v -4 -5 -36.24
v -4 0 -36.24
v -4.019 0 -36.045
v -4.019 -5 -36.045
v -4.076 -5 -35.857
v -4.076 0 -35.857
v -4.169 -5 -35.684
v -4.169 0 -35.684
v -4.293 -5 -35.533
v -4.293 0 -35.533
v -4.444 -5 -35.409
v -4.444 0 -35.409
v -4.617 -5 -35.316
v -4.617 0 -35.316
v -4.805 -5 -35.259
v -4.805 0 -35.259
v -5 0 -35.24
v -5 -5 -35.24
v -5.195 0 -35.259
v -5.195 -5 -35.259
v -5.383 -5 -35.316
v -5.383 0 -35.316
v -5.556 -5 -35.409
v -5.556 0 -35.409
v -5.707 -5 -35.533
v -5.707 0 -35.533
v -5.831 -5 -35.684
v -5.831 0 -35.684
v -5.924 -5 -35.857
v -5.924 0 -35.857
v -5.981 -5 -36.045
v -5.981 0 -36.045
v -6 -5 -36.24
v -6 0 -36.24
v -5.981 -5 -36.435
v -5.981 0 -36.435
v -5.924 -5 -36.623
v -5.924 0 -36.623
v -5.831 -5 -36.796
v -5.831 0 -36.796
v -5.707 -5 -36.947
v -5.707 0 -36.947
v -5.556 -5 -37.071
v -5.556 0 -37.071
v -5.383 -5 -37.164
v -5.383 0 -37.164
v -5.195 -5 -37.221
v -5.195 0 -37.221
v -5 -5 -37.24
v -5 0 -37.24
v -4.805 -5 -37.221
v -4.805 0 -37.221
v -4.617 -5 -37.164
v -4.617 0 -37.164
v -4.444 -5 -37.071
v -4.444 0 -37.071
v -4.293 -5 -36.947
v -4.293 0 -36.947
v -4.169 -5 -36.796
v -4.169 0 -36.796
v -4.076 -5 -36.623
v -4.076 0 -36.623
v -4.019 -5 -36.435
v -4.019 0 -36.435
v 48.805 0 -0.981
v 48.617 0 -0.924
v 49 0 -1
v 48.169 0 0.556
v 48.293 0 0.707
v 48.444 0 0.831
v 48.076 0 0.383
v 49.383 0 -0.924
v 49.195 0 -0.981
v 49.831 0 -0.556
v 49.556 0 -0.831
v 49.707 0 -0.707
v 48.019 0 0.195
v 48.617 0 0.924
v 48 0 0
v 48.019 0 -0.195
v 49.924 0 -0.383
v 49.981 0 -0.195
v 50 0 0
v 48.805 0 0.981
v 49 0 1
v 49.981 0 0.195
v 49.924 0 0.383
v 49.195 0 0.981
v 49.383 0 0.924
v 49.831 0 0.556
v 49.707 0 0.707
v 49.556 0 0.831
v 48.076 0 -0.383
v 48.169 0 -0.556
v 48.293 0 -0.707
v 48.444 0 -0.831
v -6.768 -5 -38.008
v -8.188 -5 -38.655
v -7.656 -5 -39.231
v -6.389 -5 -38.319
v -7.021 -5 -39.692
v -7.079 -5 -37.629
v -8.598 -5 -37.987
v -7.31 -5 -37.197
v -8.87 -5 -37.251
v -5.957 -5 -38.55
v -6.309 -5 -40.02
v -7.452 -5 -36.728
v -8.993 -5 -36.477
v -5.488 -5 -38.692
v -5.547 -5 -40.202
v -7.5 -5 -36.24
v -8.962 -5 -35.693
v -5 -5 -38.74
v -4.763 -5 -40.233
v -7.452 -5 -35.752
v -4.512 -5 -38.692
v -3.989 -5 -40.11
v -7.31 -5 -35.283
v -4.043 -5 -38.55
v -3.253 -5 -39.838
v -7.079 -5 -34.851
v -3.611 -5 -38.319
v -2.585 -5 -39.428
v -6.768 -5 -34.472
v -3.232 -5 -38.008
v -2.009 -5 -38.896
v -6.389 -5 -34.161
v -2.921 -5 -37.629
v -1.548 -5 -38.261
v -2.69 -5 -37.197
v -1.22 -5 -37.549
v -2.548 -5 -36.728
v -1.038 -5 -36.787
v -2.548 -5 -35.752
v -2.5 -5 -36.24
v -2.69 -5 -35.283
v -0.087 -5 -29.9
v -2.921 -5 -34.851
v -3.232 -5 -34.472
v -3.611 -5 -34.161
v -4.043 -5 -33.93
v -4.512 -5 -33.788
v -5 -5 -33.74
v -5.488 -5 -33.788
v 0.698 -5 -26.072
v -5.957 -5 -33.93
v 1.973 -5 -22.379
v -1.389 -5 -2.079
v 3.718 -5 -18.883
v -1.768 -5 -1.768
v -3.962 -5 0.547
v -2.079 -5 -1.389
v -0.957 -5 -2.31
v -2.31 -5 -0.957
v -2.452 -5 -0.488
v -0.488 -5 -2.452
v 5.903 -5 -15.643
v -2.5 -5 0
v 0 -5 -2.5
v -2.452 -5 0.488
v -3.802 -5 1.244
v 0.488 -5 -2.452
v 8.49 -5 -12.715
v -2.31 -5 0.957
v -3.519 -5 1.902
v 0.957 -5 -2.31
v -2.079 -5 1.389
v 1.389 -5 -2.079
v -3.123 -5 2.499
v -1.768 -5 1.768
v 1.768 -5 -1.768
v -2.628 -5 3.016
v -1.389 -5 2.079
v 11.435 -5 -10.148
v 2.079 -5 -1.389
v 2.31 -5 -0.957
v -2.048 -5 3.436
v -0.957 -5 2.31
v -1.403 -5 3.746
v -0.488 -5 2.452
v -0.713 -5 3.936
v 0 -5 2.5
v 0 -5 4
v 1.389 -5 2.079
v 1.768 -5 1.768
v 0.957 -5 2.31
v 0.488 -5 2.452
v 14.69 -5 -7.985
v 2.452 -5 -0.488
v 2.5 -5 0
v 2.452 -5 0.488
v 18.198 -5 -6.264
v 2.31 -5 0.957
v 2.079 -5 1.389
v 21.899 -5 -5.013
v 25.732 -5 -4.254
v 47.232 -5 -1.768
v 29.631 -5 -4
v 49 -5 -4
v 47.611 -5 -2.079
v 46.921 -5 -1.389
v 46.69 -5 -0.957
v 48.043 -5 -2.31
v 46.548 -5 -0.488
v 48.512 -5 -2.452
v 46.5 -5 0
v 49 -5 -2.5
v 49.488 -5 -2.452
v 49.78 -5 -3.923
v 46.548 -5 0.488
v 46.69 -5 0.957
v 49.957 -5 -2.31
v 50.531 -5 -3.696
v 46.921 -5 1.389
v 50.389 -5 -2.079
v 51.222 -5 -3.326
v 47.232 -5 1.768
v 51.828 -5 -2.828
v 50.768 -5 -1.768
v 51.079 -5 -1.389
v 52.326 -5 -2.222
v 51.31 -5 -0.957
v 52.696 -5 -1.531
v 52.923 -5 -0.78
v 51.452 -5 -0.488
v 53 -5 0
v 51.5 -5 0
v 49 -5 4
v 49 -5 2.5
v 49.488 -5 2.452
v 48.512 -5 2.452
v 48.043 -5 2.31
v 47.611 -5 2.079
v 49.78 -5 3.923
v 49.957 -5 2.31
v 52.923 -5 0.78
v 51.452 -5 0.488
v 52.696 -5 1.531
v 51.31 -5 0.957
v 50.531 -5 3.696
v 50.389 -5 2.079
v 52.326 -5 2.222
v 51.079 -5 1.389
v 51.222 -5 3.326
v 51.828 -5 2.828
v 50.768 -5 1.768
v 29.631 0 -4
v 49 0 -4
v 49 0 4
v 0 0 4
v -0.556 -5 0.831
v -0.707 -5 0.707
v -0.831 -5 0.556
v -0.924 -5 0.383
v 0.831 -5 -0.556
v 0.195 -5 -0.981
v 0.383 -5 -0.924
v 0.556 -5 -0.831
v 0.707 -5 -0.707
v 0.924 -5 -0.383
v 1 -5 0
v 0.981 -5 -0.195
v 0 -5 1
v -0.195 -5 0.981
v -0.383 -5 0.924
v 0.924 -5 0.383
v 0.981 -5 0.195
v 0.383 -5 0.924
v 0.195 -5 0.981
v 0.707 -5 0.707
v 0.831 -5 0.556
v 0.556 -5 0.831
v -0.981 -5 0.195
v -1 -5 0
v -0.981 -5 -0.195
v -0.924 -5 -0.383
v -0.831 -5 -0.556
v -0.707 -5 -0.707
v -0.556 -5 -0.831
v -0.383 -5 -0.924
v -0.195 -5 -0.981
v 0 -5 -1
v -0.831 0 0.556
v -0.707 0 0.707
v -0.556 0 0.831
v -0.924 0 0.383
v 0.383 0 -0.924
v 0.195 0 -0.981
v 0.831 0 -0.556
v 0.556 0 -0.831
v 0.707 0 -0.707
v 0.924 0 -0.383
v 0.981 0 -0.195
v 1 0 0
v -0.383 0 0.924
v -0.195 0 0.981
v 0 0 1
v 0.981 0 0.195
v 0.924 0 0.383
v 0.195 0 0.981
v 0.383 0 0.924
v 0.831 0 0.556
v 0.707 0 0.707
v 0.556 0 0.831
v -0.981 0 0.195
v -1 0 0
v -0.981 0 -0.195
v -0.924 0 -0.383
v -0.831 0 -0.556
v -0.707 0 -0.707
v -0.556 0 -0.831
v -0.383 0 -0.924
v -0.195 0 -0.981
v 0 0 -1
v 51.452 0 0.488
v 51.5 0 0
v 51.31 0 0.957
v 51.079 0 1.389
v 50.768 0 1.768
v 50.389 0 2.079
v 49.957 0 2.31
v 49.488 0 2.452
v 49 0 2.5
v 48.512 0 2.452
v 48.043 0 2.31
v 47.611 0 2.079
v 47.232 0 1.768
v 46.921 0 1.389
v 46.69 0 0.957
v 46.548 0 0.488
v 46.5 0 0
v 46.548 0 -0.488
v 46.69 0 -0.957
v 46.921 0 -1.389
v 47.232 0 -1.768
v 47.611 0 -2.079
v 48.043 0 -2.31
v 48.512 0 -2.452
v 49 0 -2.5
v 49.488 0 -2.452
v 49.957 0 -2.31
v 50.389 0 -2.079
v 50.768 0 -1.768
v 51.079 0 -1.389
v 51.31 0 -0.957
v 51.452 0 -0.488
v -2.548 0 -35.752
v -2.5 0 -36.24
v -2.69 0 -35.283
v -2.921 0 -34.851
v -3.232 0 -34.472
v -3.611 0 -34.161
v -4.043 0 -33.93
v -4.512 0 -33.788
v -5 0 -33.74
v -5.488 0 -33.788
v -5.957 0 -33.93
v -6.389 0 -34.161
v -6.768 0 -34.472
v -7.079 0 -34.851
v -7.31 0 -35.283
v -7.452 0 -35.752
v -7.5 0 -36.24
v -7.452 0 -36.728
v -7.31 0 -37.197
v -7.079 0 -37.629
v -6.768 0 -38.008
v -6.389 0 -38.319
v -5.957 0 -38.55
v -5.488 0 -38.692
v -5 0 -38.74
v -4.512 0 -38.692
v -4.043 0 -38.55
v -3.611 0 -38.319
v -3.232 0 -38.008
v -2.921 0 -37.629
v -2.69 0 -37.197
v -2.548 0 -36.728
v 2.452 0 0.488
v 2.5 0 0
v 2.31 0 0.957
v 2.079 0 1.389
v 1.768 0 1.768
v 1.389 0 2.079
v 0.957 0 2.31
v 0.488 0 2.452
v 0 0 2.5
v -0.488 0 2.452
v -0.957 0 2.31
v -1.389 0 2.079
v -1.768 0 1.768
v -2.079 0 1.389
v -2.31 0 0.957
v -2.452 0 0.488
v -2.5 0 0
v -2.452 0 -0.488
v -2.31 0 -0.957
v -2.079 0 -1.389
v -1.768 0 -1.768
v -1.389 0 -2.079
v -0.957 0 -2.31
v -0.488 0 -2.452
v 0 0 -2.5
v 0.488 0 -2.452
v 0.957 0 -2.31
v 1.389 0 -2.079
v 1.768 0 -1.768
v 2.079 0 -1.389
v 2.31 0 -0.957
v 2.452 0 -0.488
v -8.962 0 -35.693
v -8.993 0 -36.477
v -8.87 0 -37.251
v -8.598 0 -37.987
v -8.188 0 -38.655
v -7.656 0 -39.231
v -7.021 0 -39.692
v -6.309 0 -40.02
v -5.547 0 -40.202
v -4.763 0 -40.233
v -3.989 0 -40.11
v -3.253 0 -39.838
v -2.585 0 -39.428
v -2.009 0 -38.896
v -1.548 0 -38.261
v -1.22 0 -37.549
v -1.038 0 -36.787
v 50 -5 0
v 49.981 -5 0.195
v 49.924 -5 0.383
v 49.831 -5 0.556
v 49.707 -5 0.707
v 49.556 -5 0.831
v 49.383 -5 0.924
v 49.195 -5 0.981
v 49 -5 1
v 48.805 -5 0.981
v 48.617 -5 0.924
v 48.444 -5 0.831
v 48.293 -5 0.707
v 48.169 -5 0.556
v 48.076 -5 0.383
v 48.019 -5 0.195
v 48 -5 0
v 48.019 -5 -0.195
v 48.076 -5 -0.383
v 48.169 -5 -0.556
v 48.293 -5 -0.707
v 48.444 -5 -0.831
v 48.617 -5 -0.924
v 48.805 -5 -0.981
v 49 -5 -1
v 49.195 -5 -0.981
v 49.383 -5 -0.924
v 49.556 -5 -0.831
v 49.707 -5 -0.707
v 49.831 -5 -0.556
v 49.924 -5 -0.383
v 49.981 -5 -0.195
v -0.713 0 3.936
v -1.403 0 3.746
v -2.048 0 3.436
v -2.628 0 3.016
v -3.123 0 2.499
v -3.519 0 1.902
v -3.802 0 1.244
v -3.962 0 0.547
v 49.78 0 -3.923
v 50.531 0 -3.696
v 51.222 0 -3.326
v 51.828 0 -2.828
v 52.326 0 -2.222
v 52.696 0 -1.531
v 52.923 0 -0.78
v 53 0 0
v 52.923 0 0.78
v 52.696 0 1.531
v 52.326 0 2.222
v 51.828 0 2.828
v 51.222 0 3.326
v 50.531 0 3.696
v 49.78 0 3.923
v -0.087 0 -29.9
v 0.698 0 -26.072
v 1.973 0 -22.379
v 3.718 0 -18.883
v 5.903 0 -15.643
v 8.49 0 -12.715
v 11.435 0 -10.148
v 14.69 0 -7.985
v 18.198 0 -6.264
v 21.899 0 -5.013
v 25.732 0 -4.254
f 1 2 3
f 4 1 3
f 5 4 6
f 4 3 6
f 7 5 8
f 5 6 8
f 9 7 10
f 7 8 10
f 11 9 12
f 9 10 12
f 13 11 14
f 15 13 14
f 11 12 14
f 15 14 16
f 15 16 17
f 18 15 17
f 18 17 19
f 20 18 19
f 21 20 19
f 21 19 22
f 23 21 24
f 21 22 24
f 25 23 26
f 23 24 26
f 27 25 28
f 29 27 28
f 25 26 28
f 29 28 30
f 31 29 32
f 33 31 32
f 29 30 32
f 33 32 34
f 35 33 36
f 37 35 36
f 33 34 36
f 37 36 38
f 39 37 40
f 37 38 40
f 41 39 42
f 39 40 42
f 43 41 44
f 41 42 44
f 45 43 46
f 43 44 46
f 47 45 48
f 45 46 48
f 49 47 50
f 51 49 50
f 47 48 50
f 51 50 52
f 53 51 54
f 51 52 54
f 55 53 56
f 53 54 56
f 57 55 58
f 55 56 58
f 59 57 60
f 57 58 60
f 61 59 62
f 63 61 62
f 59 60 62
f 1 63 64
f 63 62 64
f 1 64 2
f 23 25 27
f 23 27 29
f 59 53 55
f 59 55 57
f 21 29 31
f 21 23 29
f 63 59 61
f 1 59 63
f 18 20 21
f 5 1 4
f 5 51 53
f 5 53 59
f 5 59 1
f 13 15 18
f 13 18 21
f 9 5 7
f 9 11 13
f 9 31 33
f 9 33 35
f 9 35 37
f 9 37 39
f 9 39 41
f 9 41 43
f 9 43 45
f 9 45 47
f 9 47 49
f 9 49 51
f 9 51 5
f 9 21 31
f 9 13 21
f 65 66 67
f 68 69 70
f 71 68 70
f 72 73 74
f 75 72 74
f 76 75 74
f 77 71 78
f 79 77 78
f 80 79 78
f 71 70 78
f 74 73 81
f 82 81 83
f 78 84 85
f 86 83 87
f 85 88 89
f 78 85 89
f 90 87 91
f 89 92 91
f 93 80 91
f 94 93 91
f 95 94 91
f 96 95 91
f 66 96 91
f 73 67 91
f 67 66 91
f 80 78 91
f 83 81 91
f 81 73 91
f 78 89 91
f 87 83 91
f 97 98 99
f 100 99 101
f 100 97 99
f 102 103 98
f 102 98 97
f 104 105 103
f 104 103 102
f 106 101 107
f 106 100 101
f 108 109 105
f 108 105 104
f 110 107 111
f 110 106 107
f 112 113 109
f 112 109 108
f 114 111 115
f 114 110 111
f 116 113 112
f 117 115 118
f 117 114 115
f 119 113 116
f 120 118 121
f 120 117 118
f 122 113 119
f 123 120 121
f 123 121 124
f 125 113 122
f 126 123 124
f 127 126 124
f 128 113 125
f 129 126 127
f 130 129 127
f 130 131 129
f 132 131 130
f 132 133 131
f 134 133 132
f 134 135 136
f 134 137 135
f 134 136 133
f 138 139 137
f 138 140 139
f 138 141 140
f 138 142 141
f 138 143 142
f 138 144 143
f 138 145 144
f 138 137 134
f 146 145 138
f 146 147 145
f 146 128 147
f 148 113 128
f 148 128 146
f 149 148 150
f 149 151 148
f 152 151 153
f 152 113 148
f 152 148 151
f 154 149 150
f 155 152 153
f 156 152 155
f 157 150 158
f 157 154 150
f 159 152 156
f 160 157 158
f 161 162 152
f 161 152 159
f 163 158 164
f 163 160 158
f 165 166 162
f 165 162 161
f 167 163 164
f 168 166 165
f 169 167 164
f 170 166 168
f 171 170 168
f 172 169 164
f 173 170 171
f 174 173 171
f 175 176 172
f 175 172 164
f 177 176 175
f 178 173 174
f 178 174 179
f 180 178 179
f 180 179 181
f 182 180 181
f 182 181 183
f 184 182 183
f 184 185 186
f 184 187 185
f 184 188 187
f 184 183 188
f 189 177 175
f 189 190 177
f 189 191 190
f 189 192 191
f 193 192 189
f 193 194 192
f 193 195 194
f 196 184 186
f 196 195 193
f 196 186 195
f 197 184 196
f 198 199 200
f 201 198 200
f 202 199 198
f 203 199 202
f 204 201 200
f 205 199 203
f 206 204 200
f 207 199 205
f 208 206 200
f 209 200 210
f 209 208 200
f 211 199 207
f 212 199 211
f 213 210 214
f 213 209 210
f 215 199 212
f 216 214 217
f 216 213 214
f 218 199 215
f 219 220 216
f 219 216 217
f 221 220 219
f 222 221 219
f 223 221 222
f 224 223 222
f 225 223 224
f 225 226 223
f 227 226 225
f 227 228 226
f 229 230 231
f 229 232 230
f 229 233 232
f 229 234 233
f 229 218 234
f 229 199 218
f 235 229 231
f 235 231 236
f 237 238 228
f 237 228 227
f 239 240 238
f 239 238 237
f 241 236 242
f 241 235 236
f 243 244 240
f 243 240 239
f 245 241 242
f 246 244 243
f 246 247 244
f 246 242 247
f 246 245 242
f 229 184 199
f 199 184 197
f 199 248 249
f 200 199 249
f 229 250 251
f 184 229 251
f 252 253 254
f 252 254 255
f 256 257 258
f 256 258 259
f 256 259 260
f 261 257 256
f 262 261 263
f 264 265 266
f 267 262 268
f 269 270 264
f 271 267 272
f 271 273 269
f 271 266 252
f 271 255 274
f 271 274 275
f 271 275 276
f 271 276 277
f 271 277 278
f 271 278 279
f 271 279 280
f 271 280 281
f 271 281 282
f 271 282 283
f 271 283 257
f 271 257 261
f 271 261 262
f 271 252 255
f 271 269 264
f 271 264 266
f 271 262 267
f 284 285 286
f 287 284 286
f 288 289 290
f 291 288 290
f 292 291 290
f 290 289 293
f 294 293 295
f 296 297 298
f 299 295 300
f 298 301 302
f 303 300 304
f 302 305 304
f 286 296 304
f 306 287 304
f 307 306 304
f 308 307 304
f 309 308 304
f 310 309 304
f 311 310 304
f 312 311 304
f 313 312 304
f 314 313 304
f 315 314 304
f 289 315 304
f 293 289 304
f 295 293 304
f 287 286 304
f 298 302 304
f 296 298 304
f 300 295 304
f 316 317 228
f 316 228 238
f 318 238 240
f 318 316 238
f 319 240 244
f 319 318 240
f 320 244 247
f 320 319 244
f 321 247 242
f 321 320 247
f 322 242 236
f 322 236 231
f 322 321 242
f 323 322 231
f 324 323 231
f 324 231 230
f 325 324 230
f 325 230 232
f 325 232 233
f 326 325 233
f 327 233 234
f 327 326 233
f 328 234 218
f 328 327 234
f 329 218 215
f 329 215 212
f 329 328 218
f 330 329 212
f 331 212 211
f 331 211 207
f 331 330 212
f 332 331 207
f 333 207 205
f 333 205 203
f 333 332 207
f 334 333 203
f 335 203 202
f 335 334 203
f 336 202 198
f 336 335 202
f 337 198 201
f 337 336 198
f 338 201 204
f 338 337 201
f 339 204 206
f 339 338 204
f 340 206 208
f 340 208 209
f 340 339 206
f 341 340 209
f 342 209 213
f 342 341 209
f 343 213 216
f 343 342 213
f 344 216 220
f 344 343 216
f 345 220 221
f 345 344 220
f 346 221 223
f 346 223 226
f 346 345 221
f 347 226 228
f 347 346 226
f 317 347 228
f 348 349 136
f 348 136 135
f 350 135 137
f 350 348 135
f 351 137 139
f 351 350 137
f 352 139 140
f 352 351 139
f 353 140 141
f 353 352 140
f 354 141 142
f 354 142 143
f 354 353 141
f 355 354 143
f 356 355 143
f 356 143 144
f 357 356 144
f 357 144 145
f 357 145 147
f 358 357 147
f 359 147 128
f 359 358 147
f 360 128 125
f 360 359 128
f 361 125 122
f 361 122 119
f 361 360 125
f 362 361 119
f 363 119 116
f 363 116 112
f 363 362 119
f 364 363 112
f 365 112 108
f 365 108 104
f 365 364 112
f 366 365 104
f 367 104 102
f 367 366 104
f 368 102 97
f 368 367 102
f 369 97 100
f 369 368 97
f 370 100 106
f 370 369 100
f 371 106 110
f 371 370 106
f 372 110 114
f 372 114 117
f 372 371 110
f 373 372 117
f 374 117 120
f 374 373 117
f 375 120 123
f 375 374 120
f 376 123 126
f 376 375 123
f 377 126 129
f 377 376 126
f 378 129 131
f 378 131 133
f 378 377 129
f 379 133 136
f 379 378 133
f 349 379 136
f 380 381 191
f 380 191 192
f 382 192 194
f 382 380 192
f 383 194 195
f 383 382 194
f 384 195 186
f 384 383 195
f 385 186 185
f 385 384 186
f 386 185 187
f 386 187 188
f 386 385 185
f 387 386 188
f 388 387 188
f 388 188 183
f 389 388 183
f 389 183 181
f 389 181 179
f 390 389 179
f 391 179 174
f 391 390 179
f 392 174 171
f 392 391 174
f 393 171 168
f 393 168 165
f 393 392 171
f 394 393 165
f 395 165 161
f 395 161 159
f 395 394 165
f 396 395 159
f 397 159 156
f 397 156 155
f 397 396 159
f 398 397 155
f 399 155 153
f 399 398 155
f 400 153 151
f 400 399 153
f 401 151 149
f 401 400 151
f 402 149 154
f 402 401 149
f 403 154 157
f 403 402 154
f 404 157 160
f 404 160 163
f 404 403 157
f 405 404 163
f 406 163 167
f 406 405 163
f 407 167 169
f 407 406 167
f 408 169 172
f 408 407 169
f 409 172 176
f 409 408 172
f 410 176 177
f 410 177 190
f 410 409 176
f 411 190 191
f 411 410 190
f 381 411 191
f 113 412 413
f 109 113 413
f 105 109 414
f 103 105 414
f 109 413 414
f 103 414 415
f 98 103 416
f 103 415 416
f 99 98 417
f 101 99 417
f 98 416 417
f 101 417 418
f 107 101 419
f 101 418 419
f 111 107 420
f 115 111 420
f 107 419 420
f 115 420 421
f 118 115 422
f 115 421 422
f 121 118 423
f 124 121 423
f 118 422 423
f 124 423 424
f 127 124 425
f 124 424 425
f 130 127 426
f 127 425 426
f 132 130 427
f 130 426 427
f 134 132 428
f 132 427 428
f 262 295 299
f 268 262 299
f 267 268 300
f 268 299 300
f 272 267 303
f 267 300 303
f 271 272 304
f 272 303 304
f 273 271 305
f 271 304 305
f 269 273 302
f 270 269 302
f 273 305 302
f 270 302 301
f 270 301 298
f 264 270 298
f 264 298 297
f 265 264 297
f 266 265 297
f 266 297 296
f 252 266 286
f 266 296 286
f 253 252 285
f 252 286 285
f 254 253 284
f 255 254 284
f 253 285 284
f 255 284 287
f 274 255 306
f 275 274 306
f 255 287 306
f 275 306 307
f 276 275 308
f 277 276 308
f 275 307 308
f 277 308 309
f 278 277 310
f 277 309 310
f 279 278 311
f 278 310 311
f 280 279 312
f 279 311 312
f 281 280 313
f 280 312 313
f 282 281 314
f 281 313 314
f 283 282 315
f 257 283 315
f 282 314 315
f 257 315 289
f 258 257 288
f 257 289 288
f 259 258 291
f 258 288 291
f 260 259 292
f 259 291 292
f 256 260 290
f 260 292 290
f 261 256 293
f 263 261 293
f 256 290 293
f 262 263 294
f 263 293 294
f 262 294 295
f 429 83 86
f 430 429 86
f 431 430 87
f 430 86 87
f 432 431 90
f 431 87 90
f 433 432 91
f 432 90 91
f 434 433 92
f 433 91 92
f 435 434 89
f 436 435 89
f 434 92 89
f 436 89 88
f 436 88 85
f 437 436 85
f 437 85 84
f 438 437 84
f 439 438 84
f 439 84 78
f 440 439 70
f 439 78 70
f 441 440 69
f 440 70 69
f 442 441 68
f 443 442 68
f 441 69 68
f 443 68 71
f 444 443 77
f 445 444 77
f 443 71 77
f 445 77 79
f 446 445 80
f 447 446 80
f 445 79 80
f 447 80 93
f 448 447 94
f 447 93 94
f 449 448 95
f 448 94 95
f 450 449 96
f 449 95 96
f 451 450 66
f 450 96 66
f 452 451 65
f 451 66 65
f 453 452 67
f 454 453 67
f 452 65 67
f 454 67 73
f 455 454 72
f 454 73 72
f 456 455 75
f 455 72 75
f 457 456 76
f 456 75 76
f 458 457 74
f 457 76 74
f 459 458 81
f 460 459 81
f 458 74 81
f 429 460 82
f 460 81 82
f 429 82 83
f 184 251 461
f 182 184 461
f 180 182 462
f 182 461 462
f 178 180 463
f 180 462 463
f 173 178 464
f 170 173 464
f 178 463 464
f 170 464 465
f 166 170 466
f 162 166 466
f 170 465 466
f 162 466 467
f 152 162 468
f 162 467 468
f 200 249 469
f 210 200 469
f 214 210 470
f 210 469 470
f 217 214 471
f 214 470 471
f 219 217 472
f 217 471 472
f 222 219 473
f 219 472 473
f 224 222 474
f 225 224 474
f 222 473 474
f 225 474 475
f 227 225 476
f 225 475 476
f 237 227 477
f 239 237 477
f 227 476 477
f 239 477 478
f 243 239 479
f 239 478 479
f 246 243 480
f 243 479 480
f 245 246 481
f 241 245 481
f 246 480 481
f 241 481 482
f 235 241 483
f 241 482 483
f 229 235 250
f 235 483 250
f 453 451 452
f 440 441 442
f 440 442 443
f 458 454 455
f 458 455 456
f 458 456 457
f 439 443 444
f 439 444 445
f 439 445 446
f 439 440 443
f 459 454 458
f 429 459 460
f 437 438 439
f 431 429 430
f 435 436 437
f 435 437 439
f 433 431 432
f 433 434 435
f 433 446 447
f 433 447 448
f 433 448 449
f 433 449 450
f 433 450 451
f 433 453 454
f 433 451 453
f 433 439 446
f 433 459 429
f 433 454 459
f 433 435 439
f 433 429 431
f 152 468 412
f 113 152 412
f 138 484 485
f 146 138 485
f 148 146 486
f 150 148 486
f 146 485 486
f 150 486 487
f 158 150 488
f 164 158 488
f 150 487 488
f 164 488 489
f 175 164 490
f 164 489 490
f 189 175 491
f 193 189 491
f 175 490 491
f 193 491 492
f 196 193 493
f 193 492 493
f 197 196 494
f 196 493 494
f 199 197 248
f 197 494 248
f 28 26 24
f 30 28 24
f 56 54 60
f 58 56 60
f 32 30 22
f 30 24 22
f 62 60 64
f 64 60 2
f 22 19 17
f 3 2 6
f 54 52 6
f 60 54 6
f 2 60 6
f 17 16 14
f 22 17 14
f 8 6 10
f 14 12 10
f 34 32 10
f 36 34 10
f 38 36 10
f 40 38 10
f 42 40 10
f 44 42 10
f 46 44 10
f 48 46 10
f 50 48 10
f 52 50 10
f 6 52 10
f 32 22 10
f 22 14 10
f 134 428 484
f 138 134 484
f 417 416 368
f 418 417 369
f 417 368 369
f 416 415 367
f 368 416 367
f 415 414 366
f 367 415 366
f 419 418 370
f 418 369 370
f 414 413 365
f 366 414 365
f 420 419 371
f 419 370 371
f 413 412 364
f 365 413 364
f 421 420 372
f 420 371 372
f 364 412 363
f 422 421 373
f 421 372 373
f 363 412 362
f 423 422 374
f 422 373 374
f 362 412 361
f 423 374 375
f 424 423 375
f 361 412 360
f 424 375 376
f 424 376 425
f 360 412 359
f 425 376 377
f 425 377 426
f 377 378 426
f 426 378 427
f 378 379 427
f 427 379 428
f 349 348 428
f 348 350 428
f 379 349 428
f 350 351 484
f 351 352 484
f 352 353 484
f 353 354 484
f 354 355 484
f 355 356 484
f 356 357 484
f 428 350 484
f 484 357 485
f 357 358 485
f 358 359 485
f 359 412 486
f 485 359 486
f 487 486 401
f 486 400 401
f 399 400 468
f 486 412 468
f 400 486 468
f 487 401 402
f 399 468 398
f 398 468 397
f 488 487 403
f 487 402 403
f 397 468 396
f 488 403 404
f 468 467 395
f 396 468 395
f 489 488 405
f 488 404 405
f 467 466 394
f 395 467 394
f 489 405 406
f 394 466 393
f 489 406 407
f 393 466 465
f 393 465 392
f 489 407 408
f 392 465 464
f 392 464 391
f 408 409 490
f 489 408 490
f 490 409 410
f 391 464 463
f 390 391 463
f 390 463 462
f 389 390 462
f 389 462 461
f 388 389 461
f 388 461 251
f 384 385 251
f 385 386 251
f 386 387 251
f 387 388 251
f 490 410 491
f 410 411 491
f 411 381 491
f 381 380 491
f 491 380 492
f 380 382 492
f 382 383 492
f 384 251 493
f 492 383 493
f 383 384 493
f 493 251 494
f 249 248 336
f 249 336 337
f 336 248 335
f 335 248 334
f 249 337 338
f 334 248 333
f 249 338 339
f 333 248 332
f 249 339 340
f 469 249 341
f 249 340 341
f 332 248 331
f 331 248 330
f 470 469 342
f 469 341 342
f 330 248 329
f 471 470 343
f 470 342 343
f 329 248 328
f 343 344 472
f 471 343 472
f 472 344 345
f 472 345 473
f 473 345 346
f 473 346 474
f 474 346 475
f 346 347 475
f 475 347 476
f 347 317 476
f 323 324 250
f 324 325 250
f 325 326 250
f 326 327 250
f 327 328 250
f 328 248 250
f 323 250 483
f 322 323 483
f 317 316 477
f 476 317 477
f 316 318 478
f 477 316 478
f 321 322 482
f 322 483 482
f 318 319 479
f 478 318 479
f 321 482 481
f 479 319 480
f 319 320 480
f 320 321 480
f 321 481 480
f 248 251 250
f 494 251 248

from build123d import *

# Parameters (mm, degrees)
F0_R     = 2.5
F0_R_2   = 1
F1_DEPTH = 5


with BuildPart() as f1:
    # F0 (on Front) → F1 (new body)
    with BuildSketch(Plane.XZ):
        with BuildLine():
            Line((49, 4), (0, 4))
            ThreePointArc((0, 4), (-2.628042, 3.015526), (-3.962464, 0.546698))
            Line((-3.962464, 0.546698), (-8.962464, -35.693302))
            ThreePointArc((-8.962464, -35.693302), (-5.546698, -40.202464), (-1.037536, -36.786698))
            Line((-1.037536, -36.786698), (-0.087352, -29.899768))
            ThreePointArc((-0.087352, -29.899768), (9.920813, -11.383557), (29.631128, -4))
            Line((29.631128, -4), (49, -4))
            ThreePointArc((49, -4), (53, 0), (49, 4))
        make_face()
        with Locations((-5, -36.24)):
            Circle(F0_R, mode=Mode.SUBTRACT)
        Circle(F0_R, mode=Mode.SUBTRACT)
        with Locations((49, 0)):
            Circle(F0_R, mode=Mode.SUBTRACT)
        with Locations((-5, -36.24)):
            Circle(F0_R_2)
        with Locations((49, 0)):
            Circle(F0_R_2)
        Circle(F0_R_2)
    extrude(amount=F1_DEPTH)


solid = f1.part
